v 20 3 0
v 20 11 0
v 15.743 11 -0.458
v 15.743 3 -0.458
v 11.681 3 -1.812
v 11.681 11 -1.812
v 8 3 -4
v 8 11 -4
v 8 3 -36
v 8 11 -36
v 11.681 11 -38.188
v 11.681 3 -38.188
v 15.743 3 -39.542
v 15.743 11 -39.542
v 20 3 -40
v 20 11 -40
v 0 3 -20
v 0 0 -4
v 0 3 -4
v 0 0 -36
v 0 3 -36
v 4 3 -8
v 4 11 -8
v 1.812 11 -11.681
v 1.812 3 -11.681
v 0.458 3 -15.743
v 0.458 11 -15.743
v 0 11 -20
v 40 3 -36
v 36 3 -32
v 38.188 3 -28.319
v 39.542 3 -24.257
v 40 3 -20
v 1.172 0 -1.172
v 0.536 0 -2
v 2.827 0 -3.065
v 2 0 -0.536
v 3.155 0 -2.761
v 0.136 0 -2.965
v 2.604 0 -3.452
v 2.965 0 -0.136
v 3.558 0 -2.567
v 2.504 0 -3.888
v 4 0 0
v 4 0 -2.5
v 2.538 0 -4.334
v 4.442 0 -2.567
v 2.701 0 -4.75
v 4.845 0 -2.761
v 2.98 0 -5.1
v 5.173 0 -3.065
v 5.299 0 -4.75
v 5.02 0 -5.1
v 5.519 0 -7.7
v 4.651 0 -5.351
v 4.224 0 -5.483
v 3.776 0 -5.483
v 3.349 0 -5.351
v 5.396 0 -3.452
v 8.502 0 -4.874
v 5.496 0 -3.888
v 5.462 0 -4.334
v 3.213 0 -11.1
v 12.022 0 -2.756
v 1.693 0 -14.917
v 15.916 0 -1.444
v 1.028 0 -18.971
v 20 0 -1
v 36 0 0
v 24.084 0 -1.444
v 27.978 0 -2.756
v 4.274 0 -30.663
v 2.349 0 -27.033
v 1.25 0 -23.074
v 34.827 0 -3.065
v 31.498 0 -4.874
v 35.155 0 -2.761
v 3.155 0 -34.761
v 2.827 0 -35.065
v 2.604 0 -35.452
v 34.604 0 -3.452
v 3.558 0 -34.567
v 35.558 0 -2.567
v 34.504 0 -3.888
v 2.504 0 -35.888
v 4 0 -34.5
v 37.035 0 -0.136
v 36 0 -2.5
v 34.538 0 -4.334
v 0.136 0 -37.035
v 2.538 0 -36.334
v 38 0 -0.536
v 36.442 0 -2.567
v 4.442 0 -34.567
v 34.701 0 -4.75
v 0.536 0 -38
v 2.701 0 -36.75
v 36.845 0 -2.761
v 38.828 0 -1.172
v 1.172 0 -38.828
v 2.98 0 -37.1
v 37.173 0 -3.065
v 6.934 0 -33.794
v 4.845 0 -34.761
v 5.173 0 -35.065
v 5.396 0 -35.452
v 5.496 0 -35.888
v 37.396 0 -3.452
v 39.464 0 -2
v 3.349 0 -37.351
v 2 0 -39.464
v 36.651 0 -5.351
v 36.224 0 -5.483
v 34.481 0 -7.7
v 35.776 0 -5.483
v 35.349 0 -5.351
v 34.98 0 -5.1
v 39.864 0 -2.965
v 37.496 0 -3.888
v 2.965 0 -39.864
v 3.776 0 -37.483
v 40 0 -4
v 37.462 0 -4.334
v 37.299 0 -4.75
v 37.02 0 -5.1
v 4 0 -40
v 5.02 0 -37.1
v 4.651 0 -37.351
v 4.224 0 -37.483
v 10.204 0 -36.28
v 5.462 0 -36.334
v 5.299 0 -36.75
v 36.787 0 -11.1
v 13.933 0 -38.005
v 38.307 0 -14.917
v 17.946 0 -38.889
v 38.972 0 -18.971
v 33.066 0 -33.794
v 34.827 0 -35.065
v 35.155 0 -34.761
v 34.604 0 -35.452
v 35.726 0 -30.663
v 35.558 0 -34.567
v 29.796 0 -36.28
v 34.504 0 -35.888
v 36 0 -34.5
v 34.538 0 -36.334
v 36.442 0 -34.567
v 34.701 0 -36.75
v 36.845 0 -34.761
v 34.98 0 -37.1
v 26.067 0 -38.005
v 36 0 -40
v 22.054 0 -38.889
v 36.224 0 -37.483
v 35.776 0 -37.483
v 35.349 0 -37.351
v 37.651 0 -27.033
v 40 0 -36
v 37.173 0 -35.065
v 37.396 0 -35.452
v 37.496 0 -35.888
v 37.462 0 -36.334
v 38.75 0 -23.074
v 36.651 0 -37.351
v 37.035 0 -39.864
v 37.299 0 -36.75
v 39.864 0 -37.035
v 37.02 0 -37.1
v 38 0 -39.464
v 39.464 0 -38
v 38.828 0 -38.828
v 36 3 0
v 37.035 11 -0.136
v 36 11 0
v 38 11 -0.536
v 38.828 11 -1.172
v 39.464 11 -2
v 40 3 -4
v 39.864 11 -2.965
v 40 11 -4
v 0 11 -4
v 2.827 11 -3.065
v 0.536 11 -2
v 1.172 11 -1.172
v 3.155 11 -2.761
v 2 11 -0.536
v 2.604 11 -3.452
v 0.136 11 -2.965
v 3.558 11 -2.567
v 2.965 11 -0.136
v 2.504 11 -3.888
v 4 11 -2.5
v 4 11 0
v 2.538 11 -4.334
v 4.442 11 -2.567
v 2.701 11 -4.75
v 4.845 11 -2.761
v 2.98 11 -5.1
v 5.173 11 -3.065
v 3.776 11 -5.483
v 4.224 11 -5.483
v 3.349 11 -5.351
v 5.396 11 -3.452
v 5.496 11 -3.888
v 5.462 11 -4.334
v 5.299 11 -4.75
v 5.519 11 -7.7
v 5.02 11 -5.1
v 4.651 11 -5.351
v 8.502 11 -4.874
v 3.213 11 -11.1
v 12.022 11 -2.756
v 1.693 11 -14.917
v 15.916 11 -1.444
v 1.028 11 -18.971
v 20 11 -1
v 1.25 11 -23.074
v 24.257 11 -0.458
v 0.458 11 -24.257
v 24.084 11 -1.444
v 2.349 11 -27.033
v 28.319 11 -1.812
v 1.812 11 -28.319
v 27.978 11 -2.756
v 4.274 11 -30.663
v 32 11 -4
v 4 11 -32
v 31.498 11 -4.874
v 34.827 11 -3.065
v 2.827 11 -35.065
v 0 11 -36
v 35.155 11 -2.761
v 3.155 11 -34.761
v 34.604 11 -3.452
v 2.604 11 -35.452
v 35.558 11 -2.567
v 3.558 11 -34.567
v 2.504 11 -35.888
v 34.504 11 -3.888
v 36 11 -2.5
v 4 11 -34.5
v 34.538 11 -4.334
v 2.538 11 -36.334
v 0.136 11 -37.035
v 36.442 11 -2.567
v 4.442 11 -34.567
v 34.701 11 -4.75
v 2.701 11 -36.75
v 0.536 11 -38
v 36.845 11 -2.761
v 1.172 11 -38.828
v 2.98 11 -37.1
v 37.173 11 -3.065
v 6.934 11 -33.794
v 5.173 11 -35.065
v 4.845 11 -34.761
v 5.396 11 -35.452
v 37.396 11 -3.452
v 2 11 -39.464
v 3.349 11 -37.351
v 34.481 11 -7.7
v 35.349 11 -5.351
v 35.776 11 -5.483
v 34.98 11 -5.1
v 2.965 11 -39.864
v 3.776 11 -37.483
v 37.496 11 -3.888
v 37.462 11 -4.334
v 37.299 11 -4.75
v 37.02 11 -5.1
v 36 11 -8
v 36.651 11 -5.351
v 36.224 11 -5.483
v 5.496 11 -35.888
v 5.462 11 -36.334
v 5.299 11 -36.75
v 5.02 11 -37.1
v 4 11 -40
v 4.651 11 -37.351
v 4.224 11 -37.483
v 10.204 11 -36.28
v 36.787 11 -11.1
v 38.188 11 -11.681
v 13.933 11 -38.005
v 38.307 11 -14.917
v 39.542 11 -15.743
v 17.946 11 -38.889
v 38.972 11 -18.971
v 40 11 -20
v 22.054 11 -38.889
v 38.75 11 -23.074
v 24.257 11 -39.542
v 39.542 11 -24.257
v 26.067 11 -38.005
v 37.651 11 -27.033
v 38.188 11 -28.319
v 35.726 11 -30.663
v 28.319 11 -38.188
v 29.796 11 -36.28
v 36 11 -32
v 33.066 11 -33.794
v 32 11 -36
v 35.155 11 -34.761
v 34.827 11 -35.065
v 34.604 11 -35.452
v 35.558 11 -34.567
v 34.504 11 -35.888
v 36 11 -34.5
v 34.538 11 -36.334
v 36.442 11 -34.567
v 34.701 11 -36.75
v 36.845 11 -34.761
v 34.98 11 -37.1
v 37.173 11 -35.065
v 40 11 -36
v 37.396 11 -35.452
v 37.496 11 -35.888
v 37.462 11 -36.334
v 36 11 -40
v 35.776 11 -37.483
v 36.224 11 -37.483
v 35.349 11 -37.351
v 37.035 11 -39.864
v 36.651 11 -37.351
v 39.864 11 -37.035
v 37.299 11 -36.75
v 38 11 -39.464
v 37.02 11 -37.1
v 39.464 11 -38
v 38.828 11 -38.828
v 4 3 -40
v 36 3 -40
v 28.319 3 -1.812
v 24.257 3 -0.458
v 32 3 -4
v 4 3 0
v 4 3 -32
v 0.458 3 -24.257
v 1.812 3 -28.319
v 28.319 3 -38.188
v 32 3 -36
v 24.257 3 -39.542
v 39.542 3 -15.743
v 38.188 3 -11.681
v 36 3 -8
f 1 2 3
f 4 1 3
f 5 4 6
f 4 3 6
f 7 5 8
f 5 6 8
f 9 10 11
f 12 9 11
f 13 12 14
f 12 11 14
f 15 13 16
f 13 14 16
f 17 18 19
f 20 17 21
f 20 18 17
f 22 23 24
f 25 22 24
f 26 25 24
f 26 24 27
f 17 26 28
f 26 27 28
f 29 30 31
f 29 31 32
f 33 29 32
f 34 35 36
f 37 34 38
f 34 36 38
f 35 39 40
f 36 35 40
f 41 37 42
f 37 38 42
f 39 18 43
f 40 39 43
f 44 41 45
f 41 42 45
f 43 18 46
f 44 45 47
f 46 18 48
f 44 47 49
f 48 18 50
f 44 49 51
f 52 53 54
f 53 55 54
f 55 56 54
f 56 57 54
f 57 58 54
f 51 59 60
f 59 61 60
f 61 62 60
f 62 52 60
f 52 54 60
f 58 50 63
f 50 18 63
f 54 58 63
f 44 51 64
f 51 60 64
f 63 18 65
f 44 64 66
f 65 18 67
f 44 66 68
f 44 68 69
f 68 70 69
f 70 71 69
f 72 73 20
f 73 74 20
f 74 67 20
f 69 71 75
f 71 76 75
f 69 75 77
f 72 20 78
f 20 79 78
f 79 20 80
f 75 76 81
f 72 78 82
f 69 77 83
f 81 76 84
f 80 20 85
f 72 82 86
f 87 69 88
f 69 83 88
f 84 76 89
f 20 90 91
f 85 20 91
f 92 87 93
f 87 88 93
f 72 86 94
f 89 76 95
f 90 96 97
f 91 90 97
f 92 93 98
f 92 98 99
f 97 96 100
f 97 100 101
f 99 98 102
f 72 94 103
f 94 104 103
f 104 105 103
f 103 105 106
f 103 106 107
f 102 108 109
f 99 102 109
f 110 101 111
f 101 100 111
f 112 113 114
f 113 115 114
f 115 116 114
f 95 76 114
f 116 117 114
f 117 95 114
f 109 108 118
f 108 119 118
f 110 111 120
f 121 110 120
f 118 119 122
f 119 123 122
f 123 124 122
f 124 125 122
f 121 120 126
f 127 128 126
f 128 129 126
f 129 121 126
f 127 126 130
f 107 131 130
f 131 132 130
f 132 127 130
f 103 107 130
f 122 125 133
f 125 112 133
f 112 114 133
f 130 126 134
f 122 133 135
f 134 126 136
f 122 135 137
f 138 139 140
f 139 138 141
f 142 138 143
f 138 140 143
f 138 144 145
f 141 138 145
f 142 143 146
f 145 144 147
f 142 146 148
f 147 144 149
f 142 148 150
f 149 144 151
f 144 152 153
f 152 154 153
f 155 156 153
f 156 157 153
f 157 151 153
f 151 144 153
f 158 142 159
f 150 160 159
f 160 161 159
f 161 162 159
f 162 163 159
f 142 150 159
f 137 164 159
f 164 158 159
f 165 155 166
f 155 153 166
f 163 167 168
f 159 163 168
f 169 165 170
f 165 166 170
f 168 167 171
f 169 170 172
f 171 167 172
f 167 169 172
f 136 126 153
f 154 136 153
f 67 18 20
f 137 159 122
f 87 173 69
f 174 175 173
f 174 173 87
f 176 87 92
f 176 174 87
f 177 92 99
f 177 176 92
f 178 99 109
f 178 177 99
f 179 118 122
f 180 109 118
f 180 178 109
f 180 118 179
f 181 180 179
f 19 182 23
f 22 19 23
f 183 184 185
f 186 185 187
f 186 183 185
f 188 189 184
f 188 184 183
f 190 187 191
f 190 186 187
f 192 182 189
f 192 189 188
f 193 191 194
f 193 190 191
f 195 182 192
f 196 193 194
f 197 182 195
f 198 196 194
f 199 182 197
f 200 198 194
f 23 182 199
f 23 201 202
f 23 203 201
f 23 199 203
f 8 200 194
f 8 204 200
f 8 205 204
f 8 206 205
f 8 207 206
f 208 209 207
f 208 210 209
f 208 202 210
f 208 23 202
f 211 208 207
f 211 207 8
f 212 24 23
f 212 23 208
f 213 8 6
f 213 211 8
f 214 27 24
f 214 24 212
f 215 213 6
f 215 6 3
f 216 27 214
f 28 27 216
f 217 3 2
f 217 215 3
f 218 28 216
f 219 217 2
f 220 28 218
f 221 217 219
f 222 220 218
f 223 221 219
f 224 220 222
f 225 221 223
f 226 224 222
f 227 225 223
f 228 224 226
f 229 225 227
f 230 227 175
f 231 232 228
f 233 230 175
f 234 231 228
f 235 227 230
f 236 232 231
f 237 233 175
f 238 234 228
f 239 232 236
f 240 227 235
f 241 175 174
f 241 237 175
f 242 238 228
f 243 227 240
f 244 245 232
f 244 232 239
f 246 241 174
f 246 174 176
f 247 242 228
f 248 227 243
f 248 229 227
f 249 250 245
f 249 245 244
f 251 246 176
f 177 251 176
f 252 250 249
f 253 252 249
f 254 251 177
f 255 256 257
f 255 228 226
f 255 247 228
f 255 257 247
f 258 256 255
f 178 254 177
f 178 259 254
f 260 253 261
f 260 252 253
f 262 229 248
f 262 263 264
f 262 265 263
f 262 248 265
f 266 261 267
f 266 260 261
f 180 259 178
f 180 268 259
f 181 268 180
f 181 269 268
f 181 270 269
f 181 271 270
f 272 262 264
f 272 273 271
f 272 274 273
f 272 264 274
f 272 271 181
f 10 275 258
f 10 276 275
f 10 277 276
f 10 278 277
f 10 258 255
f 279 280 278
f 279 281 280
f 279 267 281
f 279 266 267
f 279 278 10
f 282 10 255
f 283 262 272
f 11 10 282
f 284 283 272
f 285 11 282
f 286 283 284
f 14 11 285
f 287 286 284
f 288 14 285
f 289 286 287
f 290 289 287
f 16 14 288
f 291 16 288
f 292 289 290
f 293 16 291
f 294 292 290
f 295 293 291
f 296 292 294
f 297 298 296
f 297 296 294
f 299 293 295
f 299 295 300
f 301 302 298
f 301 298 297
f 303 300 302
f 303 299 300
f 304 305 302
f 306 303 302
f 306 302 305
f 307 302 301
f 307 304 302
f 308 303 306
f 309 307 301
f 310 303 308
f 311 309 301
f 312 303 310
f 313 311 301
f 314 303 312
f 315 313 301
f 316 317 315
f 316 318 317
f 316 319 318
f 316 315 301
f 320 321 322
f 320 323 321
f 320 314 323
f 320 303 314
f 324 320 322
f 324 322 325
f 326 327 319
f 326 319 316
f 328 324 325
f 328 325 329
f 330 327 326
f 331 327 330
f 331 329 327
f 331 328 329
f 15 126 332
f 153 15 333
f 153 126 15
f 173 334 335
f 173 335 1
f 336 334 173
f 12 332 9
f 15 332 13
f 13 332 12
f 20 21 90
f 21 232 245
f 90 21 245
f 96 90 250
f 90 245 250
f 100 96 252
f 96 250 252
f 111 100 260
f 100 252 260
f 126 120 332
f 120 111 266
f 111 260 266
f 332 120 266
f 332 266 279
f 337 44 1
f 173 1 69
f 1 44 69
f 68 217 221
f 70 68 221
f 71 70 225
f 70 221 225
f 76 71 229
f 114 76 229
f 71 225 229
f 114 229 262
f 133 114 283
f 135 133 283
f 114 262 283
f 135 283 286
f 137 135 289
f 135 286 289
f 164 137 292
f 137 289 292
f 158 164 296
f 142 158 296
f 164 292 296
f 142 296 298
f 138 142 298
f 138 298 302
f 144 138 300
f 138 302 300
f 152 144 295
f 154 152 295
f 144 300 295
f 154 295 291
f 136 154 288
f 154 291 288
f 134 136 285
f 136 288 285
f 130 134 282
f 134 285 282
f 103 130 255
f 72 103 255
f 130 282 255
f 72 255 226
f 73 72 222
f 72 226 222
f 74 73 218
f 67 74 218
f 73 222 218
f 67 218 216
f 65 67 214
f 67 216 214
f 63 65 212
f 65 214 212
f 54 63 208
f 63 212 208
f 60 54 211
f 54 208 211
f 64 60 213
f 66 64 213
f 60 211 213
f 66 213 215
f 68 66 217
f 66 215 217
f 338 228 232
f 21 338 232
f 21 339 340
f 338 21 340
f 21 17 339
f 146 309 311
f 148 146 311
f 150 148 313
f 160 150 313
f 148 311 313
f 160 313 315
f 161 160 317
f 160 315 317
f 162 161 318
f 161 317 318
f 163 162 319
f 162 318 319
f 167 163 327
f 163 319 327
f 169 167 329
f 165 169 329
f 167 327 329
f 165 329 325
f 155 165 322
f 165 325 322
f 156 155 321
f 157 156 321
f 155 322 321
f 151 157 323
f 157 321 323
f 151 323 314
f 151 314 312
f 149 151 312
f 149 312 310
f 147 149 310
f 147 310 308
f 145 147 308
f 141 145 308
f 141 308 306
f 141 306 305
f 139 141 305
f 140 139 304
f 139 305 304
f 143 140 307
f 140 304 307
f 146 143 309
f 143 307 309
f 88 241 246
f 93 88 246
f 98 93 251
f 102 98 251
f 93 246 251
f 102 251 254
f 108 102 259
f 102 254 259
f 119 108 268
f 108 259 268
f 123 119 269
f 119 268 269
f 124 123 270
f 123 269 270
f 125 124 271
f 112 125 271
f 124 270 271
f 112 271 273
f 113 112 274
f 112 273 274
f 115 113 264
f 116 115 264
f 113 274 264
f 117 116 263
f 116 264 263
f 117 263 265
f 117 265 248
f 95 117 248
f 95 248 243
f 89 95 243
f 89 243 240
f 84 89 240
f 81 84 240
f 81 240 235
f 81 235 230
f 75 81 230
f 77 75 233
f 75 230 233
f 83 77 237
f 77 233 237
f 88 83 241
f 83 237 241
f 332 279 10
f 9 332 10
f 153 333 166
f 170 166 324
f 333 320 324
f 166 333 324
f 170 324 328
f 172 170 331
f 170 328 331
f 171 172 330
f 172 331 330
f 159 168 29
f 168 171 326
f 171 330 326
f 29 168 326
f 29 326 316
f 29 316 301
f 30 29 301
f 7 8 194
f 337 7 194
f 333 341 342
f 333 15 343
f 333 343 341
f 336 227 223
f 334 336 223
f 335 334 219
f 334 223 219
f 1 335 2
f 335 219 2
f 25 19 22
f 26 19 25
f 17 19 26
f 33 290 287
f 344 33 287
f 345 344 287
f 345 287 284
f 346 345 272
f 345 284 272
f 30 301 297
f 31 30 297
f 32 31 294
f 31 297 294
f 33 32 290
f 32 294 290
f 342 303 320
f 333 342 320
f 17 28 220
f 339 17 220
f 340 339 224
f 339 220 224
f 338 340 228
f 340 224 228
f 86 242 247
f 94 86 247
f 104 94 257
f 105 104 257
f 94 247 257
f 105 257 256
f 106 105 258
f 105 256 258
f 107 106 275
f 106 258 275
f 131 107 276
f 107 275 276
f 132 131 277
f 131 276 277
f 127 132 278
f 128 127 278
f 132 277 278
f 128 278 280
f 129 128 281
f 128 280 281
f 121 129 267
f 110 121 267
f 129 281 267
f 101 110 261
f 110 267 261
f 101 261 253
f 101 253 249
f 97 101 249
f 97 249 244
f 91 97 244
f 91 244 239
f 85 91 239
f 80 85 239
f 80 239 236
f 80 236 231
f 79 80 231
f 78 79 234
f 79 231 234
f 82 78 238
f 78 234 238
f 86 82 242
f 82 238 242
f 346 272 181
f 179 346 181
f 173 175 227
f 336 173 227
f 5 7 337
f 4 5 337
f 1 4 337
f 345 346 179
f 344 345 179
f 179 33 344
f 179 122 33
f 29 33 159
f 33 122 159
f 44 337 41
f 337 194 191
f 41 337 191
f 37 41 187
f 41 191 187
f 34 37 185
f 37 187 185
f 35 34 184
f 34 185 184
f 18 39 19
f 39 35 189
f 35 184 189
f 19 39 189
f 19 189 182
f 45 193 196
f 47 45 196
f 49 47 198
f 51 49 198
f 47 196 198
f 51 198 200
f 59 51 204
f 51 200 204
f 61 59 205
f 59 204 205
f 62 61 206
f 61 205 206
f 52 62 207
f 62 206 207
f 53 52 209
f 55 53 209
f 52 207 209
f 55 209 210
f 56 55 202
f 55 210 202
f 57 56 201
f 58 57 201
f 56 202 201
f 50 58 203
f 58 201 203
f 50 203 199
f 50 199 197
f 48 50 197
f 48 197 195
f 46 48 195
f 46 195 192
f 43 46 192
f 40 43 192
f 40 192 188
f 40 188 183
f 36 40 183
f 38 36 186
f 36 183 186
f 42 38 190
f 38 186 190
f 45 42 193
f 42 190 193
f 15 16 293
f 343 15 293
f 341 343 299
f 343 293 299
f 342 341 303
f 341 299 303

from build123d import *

# Parameters (mm, degrees)
SKETCH1_W           = 40
SKETCH1_H           = 40
BOSS_EXTRUDE1_DEPTH = 11
FILLET1_R           = 4
FILLET2_R           = 4
FILLET3_R           = 4
FILLET4_R           = 4
SKETCH2_R           = 19
CUT_EXTRUDE1_DEPTH  = 11
CUT_EXTRUDE2_DEPTH  = 8
SKETCH4_R           = 1.5
CUT_EXTRUDE3_DEPTH  = 11


with BuildPart() as part:
    # Sketch1 → Boss-Extrude1 (new body)
    with BuildSketch(Plane(origin=(0, 0, 0), x_dir=(1, 0, 0), z_dir=(0, 1, 0))):
        with Locations((20, 20)):
            Rectangle(SKETCH1_W, SKETCH1_H)
    extrude(amount=BOSS_EXTRUDE1_DEPTH)

    # Fillet1
    fillet1_edges = [part.edges().sort_by_distance(p)[0] for p in [
        (40, 5.5, 0),
    ]]
    fillet(fillet1_edges, radius=FILLET1_R)

    # Fillet2
    fillet2_edges = [part.edges().sort_by_distance(p)[0] for p in [
        (0, 5.5, 0),
    ]]
    fillet(fillet2_edges, radius=FILLET2_R)

    # Fillet3
    fillet3_edges = [part.edges().sort_by_distance(p)[0] for p in [
        (0, 5.5, -40),
    ]]
    fillet(fillet3_edges, radius=FILLET3_R)

    # Fillet4
    fillet4_edges = [part.edges().sort_by_distance(p)[0] for p in [
        (40, 5.5, -40),
    ]]
    fillet(fillet4_edges, radius=FILLET4_R)

    # Sketch2 → Cut-Extrude1 (cut)
    with BuildSketch(Plane(origin=(0, 11, 0), x_dir=(1, 0, 0), z_dir=(0, 1, 0))):
        with Locations(Location((20, 20, 0), (0, 0, 270))):
            Circle(SKETCH2_R)
    extrude(amount=-CUT_EXTRUDE1_DEPTH, mode=Mode.SUBTRACT)

    # Sketch3 → Cut-Extrude2 (cut)
    with BuildSketch(Plane(origin=(0, 11, 0), x_dir=(1, 0, 0), z_dir=(0, 1, 0))):
        with BuildLine():
            Line((4, 32), (0, 36))
            Line((0, 36), (0, 20))
            ThreePointArc((0, 20), (1.026334039, 26.32455532), (4, 32))
        make_face()
        with BuildLine():
            Line((4, 40), (8, 36))
            ThreePointArc((8, 36), (13.67544468, 38.973665961), (20, 40))
            Line((20, 40), (4, 40))
        make_face()
        with BuildLine():
            Line((36, 40), (20, 40))
            ThreePointArc((20, 40), (26.32455532, 38.973665961), (32, 36))
            Line((32, 36), (36, 40))
        make_face()
        with BuildLine():
            Line((40, 36), (36, 32))
            ThreePointArc((36, 32), (38.973665961, 26.32455532), (40, 20))
            Line((40, 20), (40, 36))
        make_face()
        with BuildLine():
            Line((40, 4), (40, 20))
            ThreePointArc((40, 20), (38.973665961, 13.67544468), (36, 8))
            Line((36, 8), (40, 4))
        make_face()
        with BuildLine():
            ThreePointArc((32, 4), (26.32455532, 1.026334039), (20, 0))
            Line((20, 0), (36, 0))
            Line((36, 0), (32, 4))
        make_face()
        with BuildLine():
            ThreePointArc((20, 0), (13.67544468, 1.026334039), (8, 4))
            Line((8, 4), (4, 0))
            Line((4, 0), (20, 0))
        make_face()
        with BuildLine():
            ThreePointArc((4, 8), (1.026334039, 13.67544468), (0, 20))
            Line((0, 20), (0, 4))
            Line((0, 4), (4, 8))
        make_face()
    extrude(amount=-CUT_EXTRUDE2_DEPTH, mode=Mode.SUBTRACT)

    # Sketch4 → Cut-Extrude3 (cut)
    with BuildSketch(Plane(origin=(0, 11, 0), x_dir=(1, 0, 0), z_dir=(0, 1, 0))):
        with Locations(Location((36, 36, 0), (0, 0, 270))):
            Circle(SKETCH4_R)
        with Locations(Location((4, 36, 0), (0, 0, 270))):
            Circle(SKETCH4_R)
        with Locations(Location((4, 4, 0), (0, 0, 270))):
            Circle(SKETCH4_R)
        with Locations(Location((36, 4, 0), (0, 0, 270))):
            Circle(SKETCH4_R)
    extrude(amount=-CUT_EXTRUDE3_DEPTH, mode=Mode.SUBTRACT)


solid = part.part
